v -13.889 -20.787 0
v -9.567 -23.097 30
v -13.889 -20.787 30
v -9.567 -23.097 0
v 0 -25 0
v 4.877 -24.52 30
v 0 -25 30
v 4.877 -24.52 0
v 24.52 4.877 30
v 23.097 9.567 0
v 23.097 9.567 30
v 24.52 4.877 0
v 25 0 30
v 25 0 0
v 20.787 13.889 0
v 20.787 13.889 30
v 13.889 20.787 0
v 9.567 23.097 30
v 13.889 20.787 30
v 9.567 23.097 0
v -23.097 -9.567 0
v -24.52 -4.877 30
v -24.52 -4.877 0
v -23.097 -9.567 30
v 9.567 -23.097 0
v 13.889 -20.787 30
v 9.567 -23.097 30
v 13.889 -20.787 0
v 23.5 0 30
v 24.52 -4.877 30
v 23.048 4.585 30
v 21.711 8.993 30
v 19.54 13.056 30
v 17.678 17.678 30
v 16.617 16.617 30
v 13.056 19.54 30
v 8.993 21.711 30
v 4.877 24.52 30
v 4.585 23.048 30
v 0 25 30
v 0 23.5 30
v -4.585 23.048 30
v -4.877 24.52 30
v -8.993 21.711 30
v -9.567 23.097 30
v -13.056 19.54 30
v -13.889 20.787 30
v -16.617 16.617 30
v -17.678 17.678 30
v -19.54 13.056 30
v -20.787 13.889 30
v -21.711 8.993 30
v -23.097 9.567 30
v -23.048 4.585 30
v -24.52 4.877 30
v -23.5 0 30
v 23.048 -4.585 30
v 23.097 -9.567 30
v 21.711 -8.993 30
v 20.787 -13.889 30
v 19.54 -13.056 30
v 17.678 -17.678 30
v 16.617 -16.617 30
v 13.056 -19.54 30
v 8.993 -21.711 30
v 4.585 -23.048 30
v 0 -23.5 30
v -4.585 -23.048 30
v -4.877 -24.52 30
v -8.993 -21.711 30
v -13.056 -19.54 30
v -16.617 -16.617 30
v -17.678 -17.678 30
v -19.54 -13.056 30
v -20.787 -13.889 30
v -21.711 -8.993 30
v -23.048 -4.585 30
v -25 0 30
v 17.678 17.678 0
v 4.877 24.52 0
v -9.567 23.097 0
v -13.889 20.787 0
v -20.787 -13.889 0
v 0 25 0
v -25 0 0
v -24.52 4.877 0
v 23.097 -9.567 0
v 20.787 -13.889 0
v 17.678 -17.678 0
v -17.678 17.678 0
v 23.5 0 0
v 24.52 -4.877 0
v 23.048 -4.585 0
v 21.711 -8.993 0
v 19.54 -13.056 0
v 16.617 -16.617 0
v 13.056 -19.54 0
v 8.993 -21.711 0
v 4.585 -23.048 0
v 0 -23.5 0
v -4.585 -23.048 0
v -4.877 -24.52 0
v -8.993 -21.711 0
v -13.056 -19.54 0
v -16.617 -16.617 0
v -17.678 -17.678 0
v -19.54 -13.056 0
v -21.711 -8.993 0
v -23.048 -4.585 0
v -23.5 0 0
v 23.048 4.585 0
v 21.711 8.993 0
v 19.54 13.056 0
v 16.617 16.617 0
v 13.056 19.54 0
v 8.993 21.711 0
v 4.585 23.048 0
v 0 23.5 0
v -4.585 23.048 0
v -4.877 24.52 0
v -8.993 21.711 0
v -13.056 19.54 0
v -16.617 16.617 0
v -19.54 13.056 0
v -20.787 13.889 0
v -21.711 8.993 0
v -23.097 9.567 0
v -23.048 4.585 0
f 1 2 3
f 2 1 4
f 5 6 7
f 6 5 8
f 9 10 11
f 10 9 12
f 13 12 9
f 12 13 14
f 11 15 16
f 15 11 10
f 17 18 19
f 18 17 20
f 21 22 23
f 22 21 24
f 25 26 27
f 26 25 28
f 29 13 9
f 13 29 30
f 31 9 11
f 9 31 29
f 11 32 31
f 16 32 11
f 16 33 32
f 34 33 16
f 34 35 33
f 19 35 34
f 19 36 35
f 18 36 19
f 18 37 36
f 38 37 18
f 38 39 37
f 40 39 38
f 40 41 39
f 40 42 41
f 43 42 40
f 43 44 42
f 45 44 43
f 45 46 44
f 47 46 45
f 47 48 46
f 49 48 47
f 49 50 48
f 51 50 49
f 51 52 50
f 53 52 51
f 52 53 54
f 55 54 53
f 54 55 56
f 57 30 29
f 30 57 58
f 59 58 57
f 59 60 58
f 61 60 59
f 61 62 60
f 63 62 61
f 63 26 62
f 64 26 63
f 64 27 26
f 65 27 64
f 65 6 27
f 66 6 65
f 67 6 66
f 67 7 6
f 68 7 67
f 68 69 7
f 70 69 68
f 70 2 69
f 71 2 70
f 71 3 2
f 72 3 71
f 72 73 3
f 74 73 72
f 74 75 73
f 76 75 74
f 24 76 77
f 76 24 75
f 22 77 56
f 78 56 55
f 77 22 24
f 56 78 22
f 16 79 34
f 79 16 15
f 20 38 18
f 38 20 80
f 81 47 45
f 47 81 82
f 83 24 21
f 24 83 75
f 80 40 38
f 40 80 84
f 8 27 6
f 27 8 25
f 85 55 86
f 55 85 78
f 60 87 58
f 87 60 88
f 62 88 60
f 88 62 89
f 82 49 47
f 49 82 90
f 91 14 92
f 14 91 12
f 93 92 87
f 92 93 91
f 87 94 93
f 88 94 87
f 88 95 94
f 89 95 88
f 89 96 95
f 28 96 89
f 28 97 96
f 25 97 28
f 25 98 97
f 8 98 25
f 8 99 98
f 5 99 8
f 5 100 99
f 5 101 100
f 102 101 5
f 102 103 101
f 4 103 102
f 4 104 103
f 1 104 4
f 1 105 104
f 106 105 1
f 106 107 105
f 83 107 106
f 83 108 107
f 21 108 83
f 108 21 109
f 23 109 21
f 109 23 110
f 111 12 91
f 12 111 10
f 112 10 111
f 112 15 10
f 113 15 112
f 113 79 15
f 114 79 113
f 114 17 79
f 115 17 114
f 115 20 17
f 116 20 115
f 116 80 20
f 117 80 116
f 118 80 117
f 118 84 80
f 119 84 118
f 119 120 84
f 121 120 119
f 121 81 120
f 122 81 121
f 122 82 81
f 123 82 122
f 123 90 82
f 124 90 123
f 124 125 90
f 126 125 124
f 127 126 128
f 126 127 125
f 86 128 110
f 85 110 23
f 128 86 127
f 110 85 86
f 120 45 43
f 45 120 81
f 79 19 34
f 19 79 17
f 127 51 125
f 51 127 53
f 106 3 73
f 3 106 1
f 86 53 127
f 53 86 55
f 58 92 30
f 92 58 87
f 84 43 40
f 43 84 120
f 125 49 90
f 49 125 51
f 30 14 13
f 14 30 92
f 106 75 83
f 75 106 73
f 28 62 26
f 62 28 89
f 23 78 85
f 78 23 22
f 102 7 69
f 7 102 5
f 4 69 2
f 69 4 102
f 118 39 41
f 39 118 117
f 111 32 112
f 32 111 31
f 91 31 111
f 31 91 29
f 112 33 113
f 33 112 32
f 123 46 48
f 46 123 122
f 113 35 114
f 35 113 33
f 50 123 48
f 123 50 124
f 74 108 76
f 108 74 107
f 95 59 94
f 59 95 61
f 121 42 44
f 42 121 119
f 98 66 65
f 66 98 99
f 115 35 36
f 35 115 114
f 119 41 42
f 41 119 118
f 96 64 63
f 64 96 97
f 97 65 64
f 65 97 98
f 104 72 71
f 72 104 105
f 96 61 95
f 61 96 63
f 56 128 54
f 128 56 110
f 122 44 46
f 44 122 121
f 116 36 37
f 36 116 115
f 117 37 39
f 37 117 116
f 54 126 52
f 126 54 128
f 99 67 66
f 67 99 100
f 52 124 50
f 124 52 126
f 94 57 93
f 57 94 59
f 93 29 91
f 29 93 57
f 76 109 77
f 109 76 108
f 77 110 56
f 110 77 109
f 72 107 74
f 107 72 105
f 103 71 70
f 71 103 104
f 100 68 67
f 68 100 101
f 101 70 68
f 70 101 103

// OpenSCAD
$fn = 32;

// ----------------------------------------------------------------------
// Thin tube: 1.5 mm wall
// ----------------------------------------------------------------------

// --- parameters (mm) ---
tube_od = 50;             // outer diameter
tube_h = 30;              // height, Z
wall = 1.5;               // wall thickness
fit_tol = 0.02;           // tolerance for press fits, mm
free_tol = 0.2;           // tolerance for clearance fits, mm

difference() {
  cylinder(h = tube_h, d = tube_od);
  translate([0, 0, -1]) cylinder(h = tube_h + 2, d = tube_od - 2 * wall);
}
